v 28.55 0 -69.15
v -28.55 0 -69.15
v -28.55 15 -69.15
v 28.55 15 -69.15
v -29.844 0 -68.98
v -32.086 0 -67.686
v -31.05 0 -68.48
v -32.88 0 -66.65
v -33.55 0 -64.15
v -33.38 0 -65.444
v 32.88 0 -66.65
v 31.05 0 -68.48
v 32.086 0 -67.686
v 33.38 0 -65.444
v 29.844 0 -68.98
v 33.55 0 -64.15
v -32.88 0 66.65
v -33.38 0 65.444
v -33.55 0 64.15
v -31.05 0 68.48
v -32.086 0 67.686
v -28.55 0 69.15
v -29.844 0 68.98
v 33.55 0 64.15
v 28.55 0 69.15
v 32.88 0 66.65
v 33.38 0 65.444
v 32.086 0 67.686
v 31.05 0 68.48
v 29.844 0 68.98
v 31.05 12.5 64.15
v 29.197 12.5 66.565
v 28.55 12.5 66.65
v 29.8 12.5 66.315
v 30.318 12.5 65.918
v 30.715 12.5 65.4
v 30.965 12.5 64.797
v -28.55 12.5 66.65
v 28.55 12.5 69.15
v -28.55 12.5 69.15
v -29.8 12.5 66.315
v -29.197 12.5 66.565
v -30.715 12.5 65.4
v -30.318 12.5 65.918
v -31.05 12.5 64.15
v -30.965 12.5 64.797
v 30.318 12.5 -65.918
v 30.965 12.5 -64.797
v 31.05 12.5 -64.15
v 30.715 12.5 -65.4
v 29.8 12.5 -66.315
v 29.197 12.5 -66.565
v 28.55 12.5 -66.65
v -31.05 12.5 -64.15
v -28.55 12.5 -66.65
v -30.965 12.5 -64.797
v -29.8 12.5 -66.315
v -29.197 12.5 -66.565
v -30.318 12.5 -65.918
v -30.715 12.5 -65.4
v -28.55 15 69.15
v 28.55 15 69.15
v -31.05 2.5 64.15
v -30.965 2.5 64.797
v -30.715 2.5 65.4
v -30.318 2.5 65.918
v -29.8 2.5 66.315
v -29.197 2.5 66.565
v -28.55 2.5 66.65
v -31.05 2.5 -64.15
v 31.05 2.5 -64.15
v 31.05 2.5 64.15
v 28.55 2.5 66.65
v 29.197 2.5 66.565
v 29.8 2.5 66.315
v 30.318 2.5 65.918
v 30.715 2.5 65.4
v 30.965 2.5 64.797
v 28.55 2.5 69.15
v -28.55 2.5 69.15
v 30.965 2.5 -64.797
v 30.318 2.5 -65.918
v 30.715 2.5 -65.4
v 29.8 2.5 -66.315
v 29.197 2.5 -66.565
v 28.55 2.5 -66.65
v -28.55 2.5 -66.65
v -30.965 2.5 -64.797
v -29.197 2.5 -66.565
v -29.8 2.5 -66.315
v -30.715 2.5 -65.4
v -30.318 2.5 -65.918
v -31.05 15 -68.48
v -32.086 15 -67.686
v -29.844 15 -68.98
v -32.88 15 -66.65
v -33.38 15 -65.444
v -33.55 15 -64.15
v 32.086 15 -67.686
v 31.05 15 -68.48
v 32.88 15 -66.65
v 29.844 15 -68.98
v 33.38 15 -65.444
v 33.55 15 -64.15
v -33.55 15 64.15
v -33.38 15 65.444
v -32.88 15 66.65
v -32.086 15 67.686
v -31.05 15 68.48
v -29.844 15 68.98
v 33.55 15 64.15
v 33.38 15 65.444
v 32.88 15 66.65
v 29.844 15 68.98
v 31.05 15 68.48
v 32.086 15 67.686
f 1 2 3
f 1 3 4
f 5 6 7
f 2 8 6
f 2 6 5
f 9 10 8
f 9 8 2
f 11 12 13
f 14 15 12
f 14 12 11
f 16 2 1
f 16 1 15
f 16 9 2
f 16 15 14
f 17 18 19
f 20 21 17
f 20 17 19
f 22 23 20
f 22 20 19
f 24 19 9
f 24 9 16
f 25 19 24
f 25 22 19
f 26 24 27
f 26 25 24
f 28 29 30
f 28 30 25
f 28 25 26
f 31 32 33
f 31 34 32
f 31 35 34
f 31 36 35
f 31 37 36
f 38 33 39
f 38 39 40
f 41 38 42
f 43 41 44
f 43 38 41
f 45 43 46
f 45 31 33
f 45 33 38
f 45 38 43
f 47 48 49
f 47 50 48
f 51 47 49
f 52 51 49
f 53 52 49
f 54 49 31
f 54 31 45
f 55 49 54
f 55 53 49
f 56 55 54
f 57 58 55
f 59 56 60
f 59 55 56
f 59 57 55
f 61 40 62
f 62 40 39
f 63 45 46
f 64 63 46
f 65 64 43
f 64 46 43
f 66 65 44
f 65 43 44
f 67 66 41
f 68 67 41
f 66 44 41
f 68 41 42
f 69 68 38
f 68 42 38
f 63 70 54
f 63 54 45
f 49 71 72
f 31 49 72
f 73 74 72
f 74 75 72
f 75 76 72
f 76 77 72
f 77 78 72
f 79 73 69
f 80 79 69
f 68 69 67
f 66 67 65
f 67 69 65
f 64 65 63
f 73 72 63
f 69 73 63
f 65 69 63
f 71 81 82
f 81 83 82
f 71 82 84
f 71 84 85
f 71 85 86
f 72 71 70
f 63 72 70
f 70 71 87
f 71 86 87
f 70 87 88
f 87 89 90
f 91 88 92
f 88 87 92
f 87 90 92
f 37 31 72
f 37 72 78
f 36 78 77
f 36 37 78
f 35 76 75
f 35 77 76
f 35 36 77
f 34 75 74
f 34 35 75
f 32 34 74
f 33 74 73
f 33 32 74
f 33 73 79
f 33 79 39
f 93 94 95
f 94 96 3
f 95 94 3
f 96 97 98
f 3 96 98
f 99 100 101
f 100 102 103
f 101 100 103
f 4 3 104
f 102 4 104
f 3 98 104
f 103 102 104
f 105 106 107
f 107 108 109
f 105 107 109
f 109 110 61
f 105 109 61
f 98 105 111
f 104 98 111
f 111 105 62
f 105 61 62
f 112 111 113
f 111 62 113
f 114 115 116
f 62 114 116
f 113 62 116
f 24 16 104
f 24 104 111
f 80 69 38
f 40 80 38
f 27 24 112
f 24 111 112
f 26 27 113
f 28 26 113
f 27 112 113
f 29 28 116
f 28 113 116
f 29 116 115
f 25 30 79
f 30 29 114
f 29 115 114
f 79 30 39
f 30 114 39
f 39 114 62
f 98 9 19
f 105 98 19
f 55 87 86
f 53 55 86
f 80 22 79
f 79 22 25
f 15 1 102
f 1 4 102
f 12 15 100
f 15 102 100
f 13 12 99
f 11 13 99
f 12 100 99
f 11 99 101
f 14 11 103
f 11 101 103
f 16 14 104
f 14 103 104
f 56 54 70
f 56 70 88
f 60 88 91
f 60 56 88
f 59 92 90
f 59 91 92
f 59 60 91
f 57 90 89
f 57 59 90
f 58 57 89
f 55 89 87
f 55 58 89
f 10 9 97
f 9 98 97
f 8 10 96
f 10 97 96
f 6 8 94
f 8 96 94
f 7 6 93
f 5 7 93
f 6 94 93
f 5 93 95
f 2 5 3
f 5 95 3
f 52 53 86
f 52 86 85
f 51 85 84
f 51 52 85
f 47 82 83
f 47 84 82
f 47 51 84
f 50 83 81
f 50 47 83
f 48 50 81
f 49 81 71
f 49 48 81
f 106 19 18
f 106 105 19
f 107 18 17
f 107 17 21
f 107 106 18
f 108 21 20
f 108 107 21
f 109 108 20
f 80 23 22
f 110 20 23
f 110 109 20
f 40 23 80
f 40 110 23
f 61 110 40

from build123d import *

# Parameters (mm, degrees)
F0_W     = 67.1
F0_H     = 138.3
F1_DEPTH = 15
F2_R     = 5
F3_T     = -2.5


# Not quite as in the source:
# - a shell that OpenCascade refuses in one call is made with other operations: the cavity is built on its own and cut out


with BuildPart() as f1:
    # F0 (on Front) → F1 (new body)
    with BuildSketch(Plane.XZ):
        Rectangle(F0_W, F0_H)
    extrude(amount=-F1_DEPTH)

    # F2
    f2_edges = [f1.edges().sort_by_distance(p)[0] for p in [
        (-33.55, 7.5, 69.15),
        (33.55, 7.5, 69.15),
        (-33.55, 7.5, -69.15),
        (33.55, 7.5, -69.15),
    ]]
    fillet(f2_edges, radius=F2_R)

    # F3: a shell. OpenCascade refuses it in one call, so the cavity is built on its own and cut out:
    # the body offset inwards by the wall thickness, plus a prism from it out through each open face.
    f3_core = offset(f1.part, amount=F3_T, mode=Mode.PRIVATE)
    f3_exits = [f3_core.faces().sort_by_distance(p)[0] for p in [
        (0, 7.5, 66.65),
    ]]
    add(f3_core, mode=Mode.SUBTRACT)
    extrude(f3_exits, amount=-F3_T, mode=Mode.SUBTRACT)


solid = f1.part
